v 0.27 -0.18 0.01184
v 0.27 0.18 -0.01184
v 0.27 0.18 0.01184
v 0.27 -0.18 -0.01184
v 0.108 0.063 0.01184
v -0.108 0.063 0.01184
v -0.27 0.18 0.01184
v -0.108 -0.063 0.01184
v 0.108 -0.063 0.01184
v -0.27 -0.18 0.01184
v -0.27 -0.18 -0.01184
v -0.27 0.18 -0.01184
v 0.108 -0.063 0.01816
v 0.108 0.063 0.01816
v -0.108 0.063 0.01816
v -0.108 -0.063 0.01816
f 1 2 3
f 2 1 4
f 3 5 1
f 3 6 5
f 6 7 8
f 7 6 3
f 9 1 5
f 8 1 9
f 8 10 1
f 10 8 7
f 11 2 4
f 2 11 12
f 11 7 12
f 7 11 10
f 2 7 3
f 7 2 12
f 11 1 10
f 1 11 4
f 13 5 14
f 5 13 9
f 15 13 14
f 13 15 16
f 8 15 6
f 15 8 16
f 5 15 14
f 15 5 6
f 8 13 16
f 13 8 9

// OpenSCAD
// Dimension-calibrated (target: 0.36 x 0.03 x 0.54 mm)
scale([1.080000, 0.900000, 0.789490])
{
// Thin rectangular plate with a centered rectangular boss (raised pad)
// Units: mm

// Target bounding box (approx): 0.4 x 0.0 x 0.5 mm (elongated along one axis)
L = 0.50;   // length (elongated axis)
W = 0.40;   // width
T = 0.03;   // plate thickness

// Boss (centered pad) size
boss_L = 0.20;
boss_W = 0.14;
boss_H = 0.01;

// Small overlap to guarantee a single manifold solid
overlap = 0.002;

union() {
    // Base plate centered at origin
    cube([L, W, T], center=true);

    // Boss protruding from the +Z face, centered in plan view
    translate([0, 0, (T/2) + (boss_H/2) - overlap])
        cube([boss_L, boss_W, boss_H], center=true);
}
}
